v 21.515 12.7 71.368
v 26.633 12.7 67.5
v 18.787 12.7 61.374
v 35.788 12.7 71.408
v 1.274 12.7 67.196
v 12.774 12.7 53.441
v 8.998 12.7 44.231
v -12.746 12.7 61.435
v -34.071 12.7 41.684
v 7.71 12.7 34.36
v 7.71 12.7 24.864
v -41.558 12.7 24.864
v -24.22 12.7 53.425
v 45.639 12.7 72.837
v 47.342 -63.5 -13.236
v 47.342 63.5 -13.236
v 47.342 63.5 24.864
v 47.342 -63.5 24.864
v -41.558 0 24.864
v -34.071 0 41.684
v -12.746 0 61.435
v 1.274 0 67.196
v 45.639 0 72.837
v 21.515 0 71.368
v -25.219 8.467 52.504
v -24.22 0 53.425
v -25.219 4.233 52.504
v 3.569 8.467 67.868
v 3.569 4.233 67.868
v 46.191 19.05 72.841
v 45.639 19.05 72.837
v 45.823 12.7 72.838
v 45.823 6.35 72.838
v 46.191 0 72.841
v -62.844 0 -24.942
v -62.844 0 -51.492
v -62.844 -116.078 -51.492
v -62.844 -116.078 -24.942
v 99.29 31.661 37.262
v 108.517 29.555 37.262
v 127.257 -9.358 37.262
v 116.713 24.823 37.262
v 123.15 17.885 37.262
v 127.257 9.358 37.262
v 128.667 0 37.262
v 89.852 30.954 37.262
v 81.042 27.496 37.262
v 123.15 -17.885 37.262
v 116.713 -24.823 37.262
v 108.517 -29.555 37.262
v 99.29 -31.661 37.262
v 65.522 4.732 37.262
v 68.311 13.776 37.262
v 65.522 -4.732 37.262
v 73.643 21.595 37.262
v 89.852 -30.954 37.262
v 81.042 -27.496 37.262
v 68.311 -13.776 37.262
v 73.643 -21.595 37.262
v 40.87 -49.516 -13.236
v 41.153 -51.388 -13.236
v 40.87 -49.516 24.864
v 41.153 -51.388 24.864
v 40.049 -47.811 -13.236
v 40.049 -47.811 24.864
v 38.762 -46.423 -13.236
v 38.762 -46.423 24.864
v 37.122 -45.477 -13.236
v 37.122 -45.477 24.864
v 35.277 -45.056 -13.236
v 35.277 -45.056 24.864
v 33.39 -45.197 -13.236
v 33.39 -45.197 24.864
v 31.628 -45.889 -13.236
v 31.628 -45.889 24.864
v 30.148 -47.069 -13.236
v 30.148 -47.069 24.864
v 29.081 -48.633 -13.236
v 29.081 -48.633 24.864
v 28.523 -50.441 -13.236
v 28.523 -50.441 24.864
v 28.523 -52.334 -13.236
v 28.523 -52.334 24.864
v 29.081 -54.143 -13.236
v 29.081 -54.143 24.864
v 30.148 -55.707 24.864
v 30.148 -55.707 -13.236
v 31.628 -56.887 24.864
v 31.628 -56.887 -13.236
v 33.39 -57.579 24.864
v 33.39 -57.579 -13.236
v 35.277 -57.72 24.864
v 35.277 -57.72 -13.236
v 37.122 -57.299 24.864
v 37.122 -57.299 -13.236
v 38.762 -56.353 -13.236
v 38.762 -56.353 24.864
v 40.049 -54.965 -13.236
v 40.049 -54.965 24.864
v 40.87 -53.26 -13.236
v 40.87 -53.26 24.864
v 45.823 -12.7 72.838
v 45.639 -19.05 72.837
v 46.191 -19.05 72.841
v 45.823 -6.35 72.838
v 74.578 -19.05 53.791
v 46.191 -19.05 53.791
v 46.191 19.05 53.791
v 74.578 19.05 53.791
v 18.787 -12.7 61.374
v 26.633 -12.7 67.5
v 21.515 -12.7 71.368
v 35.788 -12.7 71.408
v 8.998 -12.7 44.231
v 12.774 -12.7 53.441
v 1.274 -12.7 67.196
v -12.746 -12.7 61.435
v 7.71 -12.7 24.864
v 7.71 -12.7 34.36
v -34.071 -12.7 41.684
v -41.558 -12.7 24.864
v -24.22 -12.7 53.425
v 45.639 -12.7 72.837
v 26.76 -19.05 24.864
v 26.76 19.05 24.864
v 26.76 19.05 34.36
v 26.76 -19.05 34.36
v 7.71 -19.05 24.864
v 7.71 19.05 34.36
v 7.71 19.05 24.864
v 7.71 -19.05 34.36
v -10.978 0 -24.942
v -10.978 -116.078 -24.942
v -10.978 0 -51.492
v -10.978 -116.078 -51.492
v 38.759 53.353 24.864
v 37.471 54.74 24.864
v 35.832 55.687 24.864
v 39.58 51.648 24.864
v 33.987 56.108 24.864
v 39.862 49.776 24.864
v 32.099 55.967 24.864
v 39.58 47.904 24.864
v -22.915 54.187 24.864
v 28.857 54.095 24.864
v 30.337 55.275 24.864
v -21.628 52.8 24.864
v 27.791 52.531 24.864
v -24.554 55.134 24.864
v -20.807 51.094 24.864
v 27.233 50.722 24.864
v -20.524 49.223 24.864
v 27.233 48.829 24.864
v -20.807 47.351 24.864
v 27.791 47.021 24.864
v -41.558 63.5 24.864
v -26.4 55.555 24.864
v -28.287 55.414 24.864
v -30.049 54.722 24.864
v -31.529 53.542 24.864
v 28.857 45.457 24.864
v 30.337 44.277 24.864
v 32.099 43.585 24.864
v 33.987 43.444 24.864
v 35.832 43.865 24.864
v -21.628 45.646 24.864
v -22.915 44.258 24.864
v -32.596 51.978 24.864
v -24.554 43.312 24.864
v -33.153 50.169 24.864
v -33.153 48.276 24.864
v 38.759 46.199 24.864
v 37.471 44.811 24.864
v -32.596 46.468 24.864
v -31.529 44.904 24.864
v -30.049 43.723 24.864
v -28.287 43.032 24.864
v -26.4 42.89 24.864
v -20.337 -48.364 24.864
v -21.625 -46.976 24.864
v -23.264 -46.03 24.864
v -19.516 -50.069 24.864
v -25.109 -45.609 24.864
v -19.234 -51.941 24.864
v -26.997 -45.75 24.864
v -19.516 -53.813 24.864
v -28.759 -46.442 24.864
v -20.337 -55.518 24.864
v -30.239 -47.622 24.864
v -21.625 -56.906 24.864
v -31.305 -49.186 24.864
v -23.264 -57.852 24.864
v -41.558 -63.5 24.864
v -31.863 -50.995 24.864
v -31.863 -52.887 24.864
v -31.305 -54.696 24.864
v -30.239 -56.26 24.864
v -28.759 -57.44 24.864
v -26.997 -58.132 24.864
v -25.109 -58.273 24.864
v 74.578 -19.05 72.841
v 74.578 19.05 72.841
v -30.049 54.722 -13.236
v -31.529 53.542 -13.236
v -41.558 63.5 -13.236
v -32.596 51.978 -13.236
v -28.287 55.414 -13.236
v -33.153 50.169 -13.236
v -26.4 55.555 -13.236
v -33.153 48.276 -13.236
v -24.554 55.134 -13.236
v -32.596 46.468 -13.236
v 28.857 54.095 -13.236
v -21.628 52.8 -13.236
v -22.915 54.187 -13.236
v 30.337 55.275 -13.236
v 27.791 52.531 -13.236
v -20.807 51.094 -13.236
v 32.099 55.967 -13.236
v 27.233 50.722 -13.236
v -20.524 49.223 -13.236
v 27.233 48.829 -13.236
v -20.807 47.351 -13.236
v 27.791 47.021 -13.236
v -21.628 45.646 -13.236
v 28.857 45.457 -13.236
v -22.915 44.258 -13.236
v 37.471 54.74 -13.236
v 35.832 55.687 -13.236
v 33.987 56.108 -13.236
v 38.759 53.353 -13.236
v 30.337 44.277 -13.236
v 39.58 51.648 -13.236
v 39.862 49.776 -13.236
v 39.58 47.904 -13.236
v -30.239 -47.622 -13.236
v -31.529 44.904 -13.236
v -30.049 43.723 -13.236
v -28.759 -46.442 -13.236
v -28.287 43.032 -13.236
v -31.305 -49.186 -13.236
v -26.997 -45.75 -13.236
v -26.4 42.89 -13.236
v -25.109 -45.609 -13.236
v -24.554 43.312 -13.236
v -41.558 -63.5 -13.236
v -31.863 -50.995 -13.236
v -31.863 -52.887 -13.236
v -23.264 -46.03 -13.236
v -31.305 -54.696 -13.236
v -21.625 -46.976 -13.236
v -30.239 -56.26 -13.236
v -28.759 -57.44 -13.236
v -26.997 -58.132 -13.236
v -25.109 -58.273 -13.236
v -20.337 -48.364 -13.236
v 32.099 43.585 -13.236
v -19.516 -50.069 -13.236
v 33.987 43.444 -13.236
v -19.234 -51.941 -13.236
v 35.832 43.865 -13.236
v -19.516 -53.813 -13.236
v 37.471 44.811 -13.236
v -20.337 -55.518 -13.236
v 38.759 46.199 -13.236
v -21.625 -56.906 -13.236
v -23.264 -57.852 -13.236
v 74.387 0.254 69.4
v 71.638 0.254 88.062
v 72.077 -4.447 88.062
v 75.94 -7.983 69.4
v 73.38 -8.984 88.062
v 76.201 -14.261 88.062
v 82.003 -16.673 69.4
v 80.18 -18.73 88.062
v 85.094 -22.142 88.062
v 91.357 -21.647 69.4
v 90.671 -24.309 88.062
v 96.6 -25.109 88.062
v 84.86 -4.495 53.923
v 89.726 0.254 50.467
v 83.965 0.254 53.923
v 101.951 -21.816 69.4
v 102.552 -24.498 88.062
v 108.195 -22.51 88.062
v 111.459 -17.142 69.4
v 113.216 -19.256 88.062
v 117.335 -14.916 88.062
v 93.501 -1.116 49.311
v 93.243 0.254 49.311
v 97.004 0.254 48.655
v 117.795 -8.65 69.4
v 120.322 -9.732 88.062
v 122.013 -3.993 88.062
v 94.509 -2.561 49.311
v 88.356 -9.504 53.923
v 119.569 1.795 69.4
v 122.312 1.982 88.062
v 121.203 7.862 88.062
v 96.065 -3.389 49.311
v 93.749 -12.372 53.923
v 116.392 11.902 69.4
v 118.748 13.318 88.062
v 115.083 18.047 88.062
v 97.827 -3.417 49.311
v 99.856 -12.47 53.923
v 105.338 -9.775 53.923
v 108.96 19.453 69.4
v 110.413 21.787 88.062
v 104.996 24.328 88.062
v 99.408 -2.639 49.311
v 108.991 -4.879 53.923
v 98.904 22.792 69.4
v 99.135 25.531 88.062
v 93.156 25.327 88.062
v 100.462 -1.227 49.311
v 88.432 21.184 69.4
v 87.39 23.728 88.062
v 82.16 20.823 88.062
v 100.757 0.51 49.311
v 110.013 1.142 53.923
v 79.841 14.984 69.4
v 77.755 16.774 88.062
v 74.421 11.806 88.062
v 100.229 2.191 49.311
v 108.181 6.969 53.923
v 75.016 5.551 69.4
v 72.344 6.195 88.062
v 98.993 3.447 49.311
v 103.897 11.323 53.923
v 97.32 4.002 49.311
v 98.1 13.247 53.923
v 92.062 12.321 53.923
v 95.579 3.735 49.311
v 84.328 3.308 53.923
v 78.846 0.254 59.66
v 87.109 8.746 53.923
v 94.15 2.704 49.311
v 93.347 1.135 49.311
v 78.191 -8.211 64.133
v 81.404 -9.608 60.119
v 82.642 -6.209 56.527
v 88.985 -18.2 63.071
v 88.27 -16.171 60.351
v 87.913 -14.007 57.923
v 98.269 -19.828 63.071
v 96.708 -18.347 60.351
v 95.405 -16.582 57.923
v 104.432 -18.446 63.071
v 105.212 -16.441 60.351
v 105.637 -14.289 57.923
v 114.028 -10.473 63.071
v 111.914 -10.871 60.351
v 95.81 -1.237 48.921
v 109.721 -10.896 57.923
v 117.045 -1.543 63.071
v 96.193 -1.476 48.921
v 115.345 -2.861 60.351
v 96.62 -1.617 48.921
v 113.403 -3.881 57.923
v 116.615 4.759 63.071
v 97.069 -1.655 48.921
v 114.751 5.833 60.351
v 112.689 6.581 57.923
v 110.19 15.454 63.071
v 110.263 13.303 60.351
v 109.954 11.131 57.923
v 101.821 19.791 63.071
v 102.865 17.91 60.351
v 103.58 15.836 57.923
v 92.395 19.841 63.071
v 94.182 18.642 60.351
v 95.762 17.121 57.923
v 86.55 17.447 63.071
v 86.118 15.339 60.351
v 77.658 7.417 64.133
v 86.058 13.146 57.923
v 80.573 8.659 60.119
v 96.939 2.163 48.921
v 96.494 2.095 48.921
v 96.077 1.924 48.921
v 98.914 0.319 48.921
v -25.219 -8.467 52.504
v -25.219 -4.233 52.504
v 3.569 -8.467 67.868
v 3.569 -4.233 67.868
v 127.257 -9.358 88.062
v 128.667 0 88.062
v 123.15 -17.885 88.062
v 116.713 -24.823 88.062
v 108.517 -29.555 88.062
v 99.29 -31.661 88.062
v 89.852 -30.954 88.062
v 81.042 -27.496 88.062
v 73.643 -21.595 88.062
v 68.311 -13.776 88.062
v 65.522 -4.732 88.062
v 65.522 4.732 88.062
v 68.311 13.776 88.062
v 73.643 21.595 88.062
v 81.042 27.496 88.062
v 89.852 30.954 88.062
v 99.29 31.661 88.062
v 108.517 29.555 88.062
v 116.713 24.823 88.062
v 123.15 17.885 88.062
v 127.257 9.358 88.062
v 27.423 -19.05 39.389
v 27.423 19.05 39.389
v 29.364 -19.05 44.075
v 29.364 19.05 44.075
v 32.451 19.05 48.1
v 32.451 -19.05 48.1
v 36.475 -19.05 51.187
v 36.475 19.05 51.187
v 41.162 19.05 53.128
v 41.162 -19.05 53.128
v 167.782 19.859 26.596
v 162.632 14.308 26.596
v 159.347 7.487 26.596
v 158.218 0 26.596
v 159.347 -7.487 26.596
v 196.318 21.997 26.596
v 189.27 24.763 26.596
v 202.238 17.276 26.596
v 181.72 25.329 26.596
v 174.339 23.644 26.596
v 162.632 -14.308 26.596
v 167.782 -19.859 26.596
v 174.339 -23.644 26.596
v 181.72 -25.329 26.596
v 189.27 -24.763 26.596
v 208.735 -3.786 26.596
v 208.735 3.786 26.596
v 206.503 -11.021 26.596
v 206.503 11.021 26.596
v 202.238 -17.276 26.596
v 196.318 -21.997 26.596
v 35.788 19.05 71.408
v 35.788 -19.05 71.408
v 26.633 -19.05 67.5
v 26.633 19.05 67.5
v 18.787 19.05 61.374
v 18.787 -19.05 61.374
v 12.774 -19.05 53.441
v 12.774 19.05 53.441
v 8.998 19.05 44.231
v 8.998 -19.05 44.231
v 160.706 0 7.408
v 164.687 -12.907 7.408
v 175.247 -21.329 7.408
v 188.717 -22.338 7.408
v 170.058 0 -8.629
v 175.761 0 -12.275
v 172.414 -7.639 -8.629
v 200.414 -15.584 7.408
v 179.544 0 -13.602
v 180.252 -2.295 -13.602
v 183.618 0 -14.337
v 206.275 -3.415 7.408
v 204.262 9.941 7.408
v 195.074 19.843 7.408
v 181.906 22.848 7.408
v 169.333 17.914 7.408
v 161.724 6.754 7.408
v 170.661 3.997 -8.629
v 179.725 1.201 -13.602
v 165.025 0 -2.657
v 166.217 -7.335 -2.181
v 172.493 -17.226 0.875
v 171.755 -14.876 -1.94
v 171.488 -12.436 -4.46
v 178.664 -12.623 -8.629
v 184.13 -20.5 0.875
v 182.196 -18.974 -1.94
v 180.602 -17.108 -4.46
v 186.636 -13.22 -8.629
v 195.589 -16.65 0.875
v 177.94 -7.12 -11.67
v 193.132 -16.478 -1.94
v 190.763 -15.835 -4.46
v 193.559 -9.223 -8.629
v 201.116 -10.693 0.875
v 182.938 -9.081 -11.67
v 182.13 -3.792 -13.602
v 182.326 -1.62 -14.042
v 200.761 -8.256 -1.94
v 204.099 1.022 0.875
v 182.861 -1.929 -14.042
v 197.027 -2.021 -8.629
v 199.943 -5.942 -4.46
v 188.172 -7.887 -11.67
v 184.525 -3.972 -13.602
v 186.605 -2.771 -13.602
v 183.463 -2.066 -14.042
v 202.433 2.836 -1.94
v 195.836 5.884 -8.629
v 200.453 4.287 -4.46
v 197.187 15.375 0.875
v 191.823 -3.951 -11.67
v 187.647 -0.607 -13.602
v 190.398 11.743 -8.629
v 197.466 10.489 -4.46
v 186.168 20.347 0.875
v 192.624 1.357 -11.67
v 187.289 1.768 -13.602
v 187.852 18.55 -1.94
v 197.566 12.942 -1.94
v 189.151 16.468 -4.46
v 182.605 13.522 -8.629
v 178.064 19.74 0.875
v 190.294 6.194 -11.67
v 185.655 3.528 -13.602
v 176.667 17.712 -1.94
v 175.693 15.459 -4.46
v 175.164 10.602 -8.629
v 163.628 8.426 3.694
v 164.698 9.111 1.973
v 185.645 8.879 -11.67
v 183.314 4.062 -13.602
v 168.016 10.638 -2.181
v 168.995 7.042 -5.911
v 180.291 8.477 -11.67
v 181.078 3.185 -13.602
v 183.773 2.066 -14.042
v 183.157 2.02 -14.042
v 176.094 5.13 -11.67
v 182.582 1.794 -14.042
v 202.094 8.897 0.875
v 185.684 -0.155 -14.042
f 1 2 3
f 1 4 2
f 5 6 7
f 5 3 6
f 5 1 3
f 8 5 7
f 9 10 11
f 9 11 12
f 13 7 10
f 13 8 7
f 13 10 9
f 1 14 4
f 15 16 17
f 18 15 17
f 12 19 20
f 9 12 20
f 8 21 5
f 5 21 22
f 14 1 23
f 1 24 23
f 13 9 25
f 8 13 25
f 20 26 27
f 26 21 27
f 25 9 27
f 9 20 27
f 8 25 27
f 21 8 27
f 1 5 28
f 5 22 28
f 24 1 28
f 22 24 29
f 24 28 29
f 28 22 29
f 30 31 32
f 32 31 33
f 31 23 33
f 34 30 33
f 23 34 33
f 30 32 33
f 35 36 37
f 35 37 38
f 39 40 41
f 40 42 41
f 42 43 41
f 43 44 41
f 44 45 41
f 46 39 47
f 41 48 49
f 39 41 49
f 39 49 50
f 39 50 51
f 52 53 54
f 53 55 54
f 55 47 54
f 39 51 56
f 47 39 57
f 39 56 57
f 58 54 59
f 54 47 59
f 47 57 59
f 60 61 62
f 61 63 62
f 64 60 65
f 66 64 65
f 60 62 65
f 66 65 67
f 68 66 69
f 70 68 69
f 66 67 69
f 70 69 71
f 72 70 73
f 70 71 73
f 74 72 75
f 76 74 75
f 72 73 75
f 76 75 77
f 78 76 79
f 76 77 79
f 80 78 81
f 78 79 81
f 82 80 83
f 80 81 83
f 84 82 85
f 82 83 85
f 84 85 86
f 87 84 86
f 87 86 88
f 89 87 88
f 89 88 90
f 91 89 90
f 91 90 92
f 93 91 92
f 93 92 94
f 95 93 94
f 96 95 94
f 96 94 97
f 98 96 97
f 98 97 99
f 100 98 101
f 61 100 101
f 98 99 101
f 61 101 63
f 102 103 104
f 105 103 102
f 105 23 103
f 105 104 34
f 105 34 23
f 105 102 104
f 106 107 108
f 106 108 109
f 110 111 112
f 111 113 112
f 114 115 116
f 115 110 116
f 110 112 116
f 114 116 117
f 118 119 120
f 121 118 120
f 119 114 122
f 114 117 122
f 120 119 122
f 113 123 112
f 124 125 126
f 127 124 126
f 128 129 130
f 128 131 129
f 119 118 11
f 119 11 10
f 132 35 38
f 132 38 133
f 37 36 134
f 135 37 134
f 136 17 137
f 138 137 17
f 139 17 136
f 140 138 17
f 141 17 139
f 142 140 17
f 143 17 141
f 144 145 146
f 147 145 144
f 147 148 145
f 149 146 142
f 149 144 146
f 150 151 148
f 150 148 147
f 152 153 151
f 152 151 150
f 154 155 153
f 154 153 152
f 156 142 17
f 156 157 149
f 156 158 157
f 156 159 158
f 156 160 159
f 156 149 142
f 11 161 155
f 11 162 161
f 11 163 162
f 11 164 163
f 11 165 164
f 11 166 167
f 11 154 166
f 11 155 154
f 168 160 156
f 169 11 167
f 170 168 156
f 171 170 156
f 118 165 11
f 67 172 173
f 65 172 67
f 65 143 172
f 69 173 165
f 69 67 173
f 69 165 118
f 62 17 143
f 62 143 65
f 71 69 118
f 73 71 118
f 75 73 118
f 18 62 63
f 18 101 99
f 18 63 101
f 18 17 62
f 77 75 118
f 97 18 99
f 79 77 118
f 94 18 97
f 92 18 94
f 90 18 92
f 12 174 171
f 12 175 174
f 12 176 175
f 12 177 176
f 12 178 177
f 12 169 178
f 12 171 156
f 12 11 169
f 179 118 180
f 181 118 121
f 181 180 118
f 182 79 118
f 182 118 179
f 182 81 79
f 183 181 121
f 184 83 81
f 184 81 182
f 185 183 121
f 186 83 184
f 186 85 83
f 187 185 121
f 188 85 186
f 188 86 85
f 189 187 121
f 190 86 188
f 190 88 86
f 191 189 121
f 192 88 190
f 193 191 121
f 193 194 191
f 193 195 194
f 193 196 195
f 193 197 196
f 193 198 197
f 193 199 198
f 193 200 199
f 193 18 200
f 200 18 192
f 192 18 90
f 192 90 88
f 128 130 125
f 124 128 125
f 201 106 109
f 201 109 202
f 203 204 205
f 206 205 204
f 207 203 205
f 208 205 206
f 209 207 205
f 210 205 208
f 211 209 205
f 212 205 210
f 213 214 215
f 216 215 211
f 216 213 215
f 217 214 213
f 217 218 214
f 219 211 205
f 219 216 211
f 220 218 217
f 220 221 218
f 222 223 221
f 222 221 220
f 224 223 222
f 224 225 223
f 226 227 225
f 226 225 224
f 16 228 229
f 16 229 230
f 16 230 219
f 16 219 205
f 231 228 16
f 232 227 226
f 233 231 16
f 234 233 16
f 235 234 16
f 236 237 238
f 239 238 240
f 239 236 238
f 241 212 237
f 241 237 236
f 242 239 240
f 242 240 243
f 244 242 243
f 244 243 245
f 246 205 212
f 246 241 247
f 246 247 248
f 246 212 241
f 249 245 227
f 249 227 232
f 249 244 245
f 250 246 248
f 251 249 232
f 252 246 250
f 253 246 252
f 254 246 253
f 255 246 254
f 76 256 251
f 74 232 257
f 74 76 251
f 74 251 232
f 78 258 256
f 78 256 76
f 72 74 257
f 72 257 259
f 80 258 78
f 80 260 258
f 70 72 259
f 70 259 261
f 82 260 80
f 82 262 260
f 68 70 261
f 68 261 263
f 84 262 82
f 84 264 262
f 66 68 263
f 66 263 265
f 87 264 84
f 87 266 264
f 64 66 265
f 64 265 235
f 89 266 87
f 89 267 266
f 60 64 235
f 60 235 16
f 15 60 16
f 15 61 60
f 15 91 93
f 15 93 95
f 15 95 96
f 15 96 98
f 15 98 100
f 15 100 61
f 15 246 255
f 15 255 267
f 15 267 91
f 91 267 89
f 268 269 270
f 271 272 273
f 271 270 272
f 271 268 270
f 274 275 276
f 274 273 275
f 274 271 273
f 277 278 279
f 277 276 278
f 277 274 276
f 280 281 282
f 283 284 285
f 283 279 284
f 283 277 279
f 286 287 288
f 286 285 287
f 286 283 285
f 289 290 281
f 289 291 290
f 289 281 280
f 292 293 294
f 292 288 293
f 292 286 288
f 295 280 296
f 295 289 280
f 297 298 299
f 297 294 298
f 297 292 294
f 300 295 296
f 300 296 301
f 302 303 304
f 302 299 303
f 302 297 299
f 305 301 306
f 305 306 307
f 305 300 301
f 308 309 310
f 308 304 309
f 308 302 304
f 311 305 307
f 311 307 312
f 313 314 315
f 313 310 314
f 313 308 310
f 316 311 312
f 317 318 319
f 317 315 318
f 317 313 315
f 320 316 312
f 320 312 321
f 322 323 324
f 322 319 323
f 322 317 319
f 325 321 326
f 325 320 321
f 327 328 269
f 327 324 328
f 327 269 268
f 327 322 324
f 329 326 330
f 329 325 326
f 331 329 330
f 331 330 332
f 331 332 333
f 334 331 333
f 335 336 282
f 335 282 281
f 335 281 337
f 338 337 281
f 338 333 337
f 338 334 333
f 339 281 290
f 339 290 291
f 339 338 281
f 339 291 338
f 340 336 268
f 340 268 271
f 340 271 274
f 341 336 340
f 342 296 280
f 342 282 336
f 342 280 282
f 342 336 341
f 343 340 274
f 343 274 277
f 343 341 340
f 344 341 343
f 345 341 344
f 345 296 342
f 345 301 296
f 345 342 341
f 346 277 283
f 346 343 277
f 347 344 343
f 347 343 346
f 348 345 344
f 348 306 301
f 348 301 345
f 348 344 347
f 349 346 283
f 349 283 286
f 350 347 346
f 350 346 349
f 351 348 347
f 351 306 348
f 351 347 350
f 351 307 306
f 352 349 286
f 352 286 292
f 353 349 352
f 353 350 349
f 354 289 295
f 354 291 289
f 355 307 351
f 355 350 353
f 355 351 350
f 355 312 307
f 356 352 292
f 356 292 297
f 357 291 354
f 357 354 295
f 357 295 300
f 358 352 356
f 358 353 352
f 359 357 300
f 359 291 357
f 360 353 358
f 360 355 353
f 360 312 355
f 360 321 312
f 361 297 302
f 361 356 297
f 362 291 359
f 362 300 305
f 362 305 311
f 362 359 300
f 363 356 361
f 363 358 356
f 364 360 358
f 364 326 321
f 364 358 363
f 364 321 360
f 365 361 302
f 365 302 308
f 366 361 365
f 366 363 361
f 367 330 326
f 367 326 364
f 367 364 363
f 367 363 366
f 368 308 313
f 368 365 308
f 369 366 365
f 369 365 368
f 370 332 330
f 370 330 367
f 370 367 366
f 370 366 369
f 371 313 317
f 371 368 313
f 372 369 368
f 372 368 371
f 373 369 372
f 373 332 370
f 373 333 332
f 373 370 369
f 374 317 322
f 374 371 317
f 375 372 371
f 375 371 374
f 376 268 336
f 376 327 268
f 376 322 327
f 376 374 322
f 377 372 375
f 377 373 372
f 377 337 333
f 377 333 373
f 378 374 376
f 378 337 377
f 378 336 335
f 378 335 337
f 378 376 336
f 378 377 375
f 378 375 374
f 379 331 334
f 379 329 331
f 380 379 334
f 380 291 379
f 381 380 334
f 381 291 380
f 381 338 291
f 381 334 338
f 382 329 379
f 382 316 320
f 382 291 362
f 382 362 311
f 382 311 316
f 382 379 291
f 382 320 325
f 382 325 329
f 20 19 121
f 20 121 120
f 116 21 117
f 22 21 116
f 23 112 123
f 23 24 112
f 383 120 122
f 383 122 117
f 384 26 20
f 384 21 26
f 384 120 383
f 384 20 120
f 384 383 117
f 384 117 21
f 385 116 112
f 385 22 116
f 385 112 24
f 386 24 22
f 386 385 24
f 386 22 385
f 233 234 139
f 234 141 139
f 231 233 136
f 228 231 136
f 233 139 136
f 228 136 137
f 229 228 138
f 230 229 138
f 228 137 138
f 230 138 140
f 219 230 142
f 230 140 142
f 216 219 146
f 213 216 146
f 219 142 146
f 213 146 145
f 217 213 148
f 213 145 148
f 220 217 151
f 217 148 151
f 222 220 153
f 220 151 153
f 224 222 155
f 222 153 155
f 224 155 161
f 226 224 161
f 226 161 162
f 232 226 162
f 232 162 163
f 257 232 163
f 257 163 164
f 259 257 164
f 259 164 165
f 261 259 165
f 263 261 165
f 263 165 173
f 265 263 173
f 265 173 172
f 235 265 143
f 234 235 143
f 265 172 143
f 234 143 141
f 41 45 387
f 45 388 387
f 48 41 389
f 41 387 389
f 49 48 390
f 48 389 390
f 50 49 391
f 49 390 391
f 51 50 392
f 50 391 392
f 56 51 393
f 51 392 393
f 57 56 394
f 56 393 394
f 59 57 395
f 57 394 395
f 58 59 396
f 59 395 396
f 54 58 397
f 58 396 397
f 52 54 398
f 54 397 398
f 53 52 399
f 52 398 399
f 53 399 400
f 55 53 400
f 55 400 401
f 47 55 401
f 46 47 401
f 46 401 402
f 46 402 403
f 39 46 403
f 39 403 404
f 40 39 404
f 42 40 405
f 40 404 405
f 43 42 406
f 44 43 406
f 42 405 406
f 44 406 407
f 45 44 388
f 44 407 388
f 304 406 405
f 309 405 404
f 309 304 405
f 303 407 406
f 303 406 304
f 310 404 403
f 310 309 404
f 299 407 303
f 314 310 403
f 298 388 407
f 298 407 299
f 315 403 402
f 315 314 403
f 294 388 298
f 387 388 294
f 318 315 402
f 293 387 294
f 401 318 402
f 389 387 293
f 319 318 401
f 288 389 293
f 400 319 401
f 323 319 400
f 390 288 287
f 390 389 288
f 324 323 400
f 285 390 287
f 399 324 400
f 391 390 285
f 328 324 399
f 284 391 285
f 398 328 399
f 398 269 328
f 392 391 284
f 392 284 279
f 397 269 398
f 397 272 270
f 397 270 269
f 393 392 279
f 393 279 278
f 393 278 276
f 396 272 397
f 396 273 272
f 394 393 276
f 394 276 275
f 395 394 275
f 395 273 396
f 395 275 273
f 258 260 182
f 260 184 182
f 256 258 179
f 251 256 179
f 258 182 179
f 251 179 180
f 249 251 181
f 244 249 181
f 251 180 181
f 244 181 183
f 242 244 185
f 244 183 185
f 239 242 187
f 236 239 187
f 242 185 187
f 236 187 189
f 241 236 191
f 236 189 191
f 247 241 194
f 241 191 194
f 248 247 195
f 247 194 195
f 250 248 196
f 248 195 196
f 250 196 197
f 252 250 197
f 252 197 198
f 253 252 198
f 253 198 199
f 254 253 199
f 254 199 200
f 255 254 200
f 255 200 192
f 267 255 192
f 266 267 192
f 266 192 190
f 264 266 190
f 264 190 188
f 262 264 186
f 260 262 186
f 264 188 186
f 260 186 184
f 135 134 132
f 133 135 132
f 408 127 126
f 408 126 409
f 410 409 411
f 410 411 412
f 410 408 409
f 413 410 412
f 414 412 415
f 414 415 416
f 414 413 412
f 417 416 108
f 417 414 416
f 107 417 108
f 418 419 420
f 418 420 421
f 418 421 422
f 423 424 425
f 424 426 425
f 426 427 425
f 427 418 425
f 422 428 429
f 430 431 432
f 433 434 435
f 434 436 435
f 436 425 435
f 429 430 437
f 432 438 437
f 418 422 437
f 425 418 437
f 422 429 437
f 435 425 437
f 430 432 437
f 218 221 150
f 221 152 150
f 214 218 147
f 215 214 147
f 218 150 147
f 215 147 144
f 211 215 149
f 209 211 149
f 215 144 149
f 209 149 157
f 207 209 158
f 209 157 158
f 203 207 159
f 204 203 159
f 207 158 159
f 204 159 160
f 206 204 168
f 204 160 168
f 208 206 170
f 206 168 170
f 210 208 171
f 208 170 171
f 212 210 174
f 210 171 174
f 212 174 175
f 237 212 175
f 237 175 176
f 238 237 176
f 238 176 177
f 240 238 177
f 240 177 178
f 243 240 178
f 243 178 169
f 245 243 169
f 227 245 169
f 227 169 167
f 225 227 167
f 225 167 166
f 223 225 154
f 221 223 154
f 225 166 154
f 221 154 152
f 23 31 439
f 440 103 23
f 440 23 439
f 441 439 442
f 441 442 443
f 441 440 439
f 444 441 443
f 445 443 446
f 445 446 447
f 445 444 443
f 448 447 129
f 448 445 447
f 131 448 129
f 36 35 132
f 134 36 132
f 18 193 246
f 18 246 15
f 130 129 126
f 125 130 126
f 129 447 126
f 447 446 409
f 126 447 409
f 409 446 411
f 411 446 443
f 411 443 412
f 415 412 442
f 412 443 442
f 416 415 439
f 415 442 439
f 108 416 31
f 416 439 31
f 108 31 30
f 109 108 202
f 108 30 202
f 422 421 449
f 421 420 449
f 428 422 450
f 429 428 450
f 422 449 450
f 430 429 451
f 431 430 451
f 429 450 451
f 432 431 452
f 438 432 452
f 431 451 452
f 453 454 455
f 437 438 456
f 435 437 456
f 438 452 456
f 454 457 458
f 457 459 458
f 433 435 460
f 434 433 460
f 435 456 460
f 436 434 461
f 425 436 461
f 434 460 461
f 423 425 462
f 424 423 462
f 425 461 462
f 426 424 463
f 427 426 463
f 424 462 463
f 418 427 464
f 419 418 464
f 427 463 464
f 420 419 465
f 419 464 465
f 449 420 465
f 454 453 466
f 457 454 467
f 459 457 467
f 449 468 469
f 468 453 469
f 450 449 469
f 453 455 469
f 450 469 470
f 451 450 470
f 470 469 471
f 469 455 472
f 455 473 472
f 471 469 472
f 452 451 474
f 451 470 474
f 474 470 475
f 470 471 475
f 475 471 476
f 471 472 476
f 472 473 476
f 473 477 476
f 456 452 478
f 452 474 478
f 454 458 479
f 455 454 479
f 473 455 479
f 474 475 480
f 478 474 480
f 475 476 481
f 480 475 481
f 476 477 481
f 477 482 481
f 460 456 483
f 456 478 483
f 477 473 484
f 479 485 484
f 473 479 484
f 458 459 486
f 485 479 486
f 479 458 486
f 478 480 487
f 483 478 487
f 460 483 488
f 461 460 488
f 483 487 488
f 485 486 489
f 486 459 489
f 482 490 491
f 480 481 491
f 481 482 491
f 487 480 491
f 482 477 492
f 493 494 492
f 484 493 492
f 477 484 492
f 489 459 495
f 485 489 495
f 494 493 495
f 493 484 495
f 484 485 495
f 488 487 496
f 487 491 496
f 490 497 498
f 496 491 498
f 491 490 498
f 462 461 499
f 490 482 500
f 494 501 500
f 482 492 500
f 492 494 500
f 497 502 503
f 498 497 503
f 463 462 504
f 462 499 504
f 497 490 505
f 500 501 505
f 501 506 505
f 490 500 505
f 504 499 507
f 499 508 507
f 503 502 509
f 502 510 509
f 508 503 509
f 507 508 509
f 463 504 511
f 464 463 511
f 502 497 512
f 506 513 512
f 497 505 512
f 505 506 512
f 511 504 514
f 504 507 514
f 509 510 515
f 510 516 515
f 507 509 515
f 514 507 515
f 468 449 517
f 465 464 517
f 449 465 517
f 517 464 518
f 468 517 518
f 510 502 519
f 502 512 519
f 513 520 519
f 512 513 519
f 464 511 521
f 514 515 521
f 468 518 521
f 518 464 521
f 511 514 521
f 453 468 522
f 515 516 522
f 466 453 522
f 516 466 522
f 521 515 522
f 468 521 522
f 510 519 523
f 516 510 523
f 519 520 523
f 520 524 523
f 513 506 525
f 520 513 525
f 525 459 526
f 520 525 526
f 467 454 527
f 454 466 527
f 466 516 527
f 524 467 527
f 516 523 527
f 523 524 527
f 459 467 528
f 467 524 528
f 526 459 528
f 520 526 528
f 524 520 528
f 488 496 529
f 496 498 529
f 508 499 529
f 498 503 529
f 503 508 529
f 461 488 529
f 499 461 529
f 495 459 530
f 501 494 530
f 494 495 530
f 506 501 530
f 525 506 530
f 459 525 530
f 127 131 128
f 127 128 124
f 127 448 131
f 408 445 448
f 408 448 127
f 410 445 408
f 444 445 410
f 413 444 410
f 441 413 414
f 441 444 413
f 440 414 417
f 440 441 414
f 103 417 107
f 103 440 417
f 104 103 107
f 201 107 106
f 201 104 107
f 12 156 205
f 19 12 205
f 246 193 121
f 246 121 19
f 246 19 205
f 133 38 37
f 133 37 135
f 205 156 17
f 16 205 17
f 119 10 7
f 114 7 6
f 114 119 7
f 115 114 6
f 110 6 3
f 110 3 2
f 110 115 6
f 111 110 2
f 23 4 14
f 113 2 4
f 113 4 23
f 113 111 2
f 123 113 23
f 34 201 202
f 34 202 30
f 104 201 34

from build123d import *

# Parameters (mm, degrees)
F1_DEPTH  = 63.5
F2_DEPTH  = 12.7
F0_W      = 31.75
F0_H      = 50.8
F4_DEPTH  = 19.05
F8_R      = 6.35
F9_DEPTH  = 38.1
F11_W     = 51.8660424277
F11_H     = 26.5504792333
F12_DEPTH = 116.078


# Not quite as in the source:
# - ends of sketch curves that miss each other by under 0.0002 mm in the source are joined


with BuildPart() as f1:
    # F0 (on Front) → F1 (new body, symmetric)
    with BuildSketch(Plane.XZ):
        Polygon((7.7104573138, 24.8640864372), (-41.5579093681, 24.8640864372), (-41.5579093681, -13.2359135628), (47.3420906319, -13.2359135628), (47.3420906319, 24.8640864372), (26.7604570836, 24.8640864372), align=None)
    extrude(amount=F1_DEPTH, both=True)

    # F0 (on Front) → F2 (join, symmetric)
    with BuildSketch(Plane.XZ):
        with BuildLine():
            add(Edge.make_bspline(
                [(-41.5579093681, 24.8640864372), (-31.1663596882, 59.2701950139), (-3.3499980814, 72.437082025), (45.6389581324, 72.8365695774)],
                knots=[0, 0, 0, 0, 99.6343082165, 99.6343082165, 99.6343082165, 99.6343082165], degree=3))
            Line((-41.5579093681, 24.8640864372), (7.7104573138, 24.8640864372))
            Line((7.7104573138, 24.8640864372), (7.7104573138, 34.3604520069))
            ThreePointArc((7.7104573138, 34.3604520069), (18.7866933694, 61.3742578065), (45.6389581324, 72.8365695774))
        make_face()
    extrude(amount=F2_DEPTH, both=True)


with BuildPart() as f3:
    # F0 (on Front) → F3 (revolve)
    with BuildSketch(Plane.XZ):
        with Locations((112.7920650244, 62.6620671988)):
            Rectangle(F0_W, F0_H)
    revolve(axis=Axis((96.9170650244, 0, 62.6620671988), (0, 0, -1)))


with BuildPart() as f4:
    # F0 (on Front) → F4 (new body, symmetric)
    with BuildSketch(Plane.XZ):
        with BuildLine():
            Line((7.7104573138, 34.3604520069), (7.7104573138, 24.8640864372))
            Line((7.7104573138, 24.8640864372), (26.7604570836, 24.8640864372))
            Line((26.7604570836, 24.8640864372), (26.7604570836, 34.3604520069))
            ThreePointArc((26.7604570836, 34.3604520069), (32.4513930763, 48.0995868632), (46.1905279326, 53.7905228559))
            Line((46.1905279326, 53.7905228559), (74.5775754276, 53.7905228559))
            Line((74.5775754276, 53.7905228559), (74.5775754276, 72.8405192494))
            Line((74.5775754276, 72.8405192494), (46.1905279326, 72.8405192494))
            add(Edge.make_bspline(
                [(45.6389581324, 72.8365695774), (45.8225174109, 72.8380664382), (46.0063739453, 72.8393840491), (46.1905279326, 72.8405192494)],
                knots=[99.6343082165, 99.6343082165, 99.6343082165, 99.6343082165, 100.0076332094, 100.0076332094, 100.0076332094, 100.0076332094], degree=3))
            ThreePointArc((45.6389581324, 72.8365695774), (18.7866933694, 61.3742578065), (7.7104573138, 34.3604520069))
        make_face()
    extrude(amount=F4_DEPTH, both=True)


with BuildPart() as f5:
    # F0 (on Front) → F5 (revolve)
    with BuildSketch(Plane.XZ):
        with BuildLine():
            Line((183.6182943821, 26.596263051), (158.2182943821, 26.596263051))
            add(Edge.make_bspline(
                [(158.2182943821, 26.596263051), (158.61569345, 0), (168.516787076, -12.7471527085), (183.6182943821, -14.3367853016)],
                knots=[0, 0, 0, 0, 48.1733790328, 48.1733790328, 48.1733790328, 48.1733790328], degree=3))
            Line((183.6182943821, -14.3367853016), (183.6182943821, 26.596263051))
        make_face()
    revolve(axis=Axis((183.6182943821, 0, 6.1297388747), (0, 0, 1)))


with BuildPart() as f6_1:
    # F6: copy of F5
    add(f5.part.moved(Location((-86.614, 0.254, 62.992))))


with BuildPart() as f3_1:
    add(f3.part)

    # F7: cut F6_1
    add(f6_1.part, mode=Mode.SUBTRACT)


with BuildPart() as f9:
    # F8 (on Top) → F9 (new body, symmetric)
    with BuildSketch(Plane.XY):
        with Locations((-26.8744081259, 49.222741276)):
            Circle(F8_R)
    extrude(amount=F9_DEPTH, both=True)


with BuildPart() as f9b:
    # F8 (on Top) → F9, piece 2 (new body, symmetric)
    with BuildSketch(Plane.XY):
        with Locations((33.5120453119, 49.7758090496)):
            Circle(F8_R)
    extrude(amount=F9_DEPTH, both=True)


with BuildPart() as f9c:
    # F8 (on Top) → F9, piece 3 (new body, symmetric)
    with BuildSketch(Plane.XY):
        with Locations((-25.5839244187, -51.9409514964)):
            Circle(F8_R)
    extrude(amount=F9_DEPTH, both=True)


with BuildPart() as f9d:
    # F8 (on Top) → F9, piece 4 (new body, symmetric)
    with BuildSketch(Plane.XY):
        with Locations((34.8025290191, -51.3878837228)):
            Circle(F8_R)
    extrude(amount=F9_DEPTH, both=True)


with BuildPart() as f1_1:
    add(f1.part)

    # F10: cut F9c, F9d, F9, F9b
    add(f9c.part, mode=Mode.SUBTRACT)
    add(f9d.part, mode=Mode.SUBTRACT)
    add(f9.part, mode=Mode.SUBTRACT)
    add(f9b.part, mode=Mode.SUBTRACT)


with BuildPart() as f12:
    # F11 (on Front) → F12 (new body)
    with BuildSketch(Plane.XZ):
        with Locations((-36.9113073684, -38.2168479264)):
            Rectangle(F11_W, F11_H)
    extrude(amount=F12_DEPTH)


solid = Compound([f4.part, f5.part, f3_1.part, f1_1.part, f12.part])
